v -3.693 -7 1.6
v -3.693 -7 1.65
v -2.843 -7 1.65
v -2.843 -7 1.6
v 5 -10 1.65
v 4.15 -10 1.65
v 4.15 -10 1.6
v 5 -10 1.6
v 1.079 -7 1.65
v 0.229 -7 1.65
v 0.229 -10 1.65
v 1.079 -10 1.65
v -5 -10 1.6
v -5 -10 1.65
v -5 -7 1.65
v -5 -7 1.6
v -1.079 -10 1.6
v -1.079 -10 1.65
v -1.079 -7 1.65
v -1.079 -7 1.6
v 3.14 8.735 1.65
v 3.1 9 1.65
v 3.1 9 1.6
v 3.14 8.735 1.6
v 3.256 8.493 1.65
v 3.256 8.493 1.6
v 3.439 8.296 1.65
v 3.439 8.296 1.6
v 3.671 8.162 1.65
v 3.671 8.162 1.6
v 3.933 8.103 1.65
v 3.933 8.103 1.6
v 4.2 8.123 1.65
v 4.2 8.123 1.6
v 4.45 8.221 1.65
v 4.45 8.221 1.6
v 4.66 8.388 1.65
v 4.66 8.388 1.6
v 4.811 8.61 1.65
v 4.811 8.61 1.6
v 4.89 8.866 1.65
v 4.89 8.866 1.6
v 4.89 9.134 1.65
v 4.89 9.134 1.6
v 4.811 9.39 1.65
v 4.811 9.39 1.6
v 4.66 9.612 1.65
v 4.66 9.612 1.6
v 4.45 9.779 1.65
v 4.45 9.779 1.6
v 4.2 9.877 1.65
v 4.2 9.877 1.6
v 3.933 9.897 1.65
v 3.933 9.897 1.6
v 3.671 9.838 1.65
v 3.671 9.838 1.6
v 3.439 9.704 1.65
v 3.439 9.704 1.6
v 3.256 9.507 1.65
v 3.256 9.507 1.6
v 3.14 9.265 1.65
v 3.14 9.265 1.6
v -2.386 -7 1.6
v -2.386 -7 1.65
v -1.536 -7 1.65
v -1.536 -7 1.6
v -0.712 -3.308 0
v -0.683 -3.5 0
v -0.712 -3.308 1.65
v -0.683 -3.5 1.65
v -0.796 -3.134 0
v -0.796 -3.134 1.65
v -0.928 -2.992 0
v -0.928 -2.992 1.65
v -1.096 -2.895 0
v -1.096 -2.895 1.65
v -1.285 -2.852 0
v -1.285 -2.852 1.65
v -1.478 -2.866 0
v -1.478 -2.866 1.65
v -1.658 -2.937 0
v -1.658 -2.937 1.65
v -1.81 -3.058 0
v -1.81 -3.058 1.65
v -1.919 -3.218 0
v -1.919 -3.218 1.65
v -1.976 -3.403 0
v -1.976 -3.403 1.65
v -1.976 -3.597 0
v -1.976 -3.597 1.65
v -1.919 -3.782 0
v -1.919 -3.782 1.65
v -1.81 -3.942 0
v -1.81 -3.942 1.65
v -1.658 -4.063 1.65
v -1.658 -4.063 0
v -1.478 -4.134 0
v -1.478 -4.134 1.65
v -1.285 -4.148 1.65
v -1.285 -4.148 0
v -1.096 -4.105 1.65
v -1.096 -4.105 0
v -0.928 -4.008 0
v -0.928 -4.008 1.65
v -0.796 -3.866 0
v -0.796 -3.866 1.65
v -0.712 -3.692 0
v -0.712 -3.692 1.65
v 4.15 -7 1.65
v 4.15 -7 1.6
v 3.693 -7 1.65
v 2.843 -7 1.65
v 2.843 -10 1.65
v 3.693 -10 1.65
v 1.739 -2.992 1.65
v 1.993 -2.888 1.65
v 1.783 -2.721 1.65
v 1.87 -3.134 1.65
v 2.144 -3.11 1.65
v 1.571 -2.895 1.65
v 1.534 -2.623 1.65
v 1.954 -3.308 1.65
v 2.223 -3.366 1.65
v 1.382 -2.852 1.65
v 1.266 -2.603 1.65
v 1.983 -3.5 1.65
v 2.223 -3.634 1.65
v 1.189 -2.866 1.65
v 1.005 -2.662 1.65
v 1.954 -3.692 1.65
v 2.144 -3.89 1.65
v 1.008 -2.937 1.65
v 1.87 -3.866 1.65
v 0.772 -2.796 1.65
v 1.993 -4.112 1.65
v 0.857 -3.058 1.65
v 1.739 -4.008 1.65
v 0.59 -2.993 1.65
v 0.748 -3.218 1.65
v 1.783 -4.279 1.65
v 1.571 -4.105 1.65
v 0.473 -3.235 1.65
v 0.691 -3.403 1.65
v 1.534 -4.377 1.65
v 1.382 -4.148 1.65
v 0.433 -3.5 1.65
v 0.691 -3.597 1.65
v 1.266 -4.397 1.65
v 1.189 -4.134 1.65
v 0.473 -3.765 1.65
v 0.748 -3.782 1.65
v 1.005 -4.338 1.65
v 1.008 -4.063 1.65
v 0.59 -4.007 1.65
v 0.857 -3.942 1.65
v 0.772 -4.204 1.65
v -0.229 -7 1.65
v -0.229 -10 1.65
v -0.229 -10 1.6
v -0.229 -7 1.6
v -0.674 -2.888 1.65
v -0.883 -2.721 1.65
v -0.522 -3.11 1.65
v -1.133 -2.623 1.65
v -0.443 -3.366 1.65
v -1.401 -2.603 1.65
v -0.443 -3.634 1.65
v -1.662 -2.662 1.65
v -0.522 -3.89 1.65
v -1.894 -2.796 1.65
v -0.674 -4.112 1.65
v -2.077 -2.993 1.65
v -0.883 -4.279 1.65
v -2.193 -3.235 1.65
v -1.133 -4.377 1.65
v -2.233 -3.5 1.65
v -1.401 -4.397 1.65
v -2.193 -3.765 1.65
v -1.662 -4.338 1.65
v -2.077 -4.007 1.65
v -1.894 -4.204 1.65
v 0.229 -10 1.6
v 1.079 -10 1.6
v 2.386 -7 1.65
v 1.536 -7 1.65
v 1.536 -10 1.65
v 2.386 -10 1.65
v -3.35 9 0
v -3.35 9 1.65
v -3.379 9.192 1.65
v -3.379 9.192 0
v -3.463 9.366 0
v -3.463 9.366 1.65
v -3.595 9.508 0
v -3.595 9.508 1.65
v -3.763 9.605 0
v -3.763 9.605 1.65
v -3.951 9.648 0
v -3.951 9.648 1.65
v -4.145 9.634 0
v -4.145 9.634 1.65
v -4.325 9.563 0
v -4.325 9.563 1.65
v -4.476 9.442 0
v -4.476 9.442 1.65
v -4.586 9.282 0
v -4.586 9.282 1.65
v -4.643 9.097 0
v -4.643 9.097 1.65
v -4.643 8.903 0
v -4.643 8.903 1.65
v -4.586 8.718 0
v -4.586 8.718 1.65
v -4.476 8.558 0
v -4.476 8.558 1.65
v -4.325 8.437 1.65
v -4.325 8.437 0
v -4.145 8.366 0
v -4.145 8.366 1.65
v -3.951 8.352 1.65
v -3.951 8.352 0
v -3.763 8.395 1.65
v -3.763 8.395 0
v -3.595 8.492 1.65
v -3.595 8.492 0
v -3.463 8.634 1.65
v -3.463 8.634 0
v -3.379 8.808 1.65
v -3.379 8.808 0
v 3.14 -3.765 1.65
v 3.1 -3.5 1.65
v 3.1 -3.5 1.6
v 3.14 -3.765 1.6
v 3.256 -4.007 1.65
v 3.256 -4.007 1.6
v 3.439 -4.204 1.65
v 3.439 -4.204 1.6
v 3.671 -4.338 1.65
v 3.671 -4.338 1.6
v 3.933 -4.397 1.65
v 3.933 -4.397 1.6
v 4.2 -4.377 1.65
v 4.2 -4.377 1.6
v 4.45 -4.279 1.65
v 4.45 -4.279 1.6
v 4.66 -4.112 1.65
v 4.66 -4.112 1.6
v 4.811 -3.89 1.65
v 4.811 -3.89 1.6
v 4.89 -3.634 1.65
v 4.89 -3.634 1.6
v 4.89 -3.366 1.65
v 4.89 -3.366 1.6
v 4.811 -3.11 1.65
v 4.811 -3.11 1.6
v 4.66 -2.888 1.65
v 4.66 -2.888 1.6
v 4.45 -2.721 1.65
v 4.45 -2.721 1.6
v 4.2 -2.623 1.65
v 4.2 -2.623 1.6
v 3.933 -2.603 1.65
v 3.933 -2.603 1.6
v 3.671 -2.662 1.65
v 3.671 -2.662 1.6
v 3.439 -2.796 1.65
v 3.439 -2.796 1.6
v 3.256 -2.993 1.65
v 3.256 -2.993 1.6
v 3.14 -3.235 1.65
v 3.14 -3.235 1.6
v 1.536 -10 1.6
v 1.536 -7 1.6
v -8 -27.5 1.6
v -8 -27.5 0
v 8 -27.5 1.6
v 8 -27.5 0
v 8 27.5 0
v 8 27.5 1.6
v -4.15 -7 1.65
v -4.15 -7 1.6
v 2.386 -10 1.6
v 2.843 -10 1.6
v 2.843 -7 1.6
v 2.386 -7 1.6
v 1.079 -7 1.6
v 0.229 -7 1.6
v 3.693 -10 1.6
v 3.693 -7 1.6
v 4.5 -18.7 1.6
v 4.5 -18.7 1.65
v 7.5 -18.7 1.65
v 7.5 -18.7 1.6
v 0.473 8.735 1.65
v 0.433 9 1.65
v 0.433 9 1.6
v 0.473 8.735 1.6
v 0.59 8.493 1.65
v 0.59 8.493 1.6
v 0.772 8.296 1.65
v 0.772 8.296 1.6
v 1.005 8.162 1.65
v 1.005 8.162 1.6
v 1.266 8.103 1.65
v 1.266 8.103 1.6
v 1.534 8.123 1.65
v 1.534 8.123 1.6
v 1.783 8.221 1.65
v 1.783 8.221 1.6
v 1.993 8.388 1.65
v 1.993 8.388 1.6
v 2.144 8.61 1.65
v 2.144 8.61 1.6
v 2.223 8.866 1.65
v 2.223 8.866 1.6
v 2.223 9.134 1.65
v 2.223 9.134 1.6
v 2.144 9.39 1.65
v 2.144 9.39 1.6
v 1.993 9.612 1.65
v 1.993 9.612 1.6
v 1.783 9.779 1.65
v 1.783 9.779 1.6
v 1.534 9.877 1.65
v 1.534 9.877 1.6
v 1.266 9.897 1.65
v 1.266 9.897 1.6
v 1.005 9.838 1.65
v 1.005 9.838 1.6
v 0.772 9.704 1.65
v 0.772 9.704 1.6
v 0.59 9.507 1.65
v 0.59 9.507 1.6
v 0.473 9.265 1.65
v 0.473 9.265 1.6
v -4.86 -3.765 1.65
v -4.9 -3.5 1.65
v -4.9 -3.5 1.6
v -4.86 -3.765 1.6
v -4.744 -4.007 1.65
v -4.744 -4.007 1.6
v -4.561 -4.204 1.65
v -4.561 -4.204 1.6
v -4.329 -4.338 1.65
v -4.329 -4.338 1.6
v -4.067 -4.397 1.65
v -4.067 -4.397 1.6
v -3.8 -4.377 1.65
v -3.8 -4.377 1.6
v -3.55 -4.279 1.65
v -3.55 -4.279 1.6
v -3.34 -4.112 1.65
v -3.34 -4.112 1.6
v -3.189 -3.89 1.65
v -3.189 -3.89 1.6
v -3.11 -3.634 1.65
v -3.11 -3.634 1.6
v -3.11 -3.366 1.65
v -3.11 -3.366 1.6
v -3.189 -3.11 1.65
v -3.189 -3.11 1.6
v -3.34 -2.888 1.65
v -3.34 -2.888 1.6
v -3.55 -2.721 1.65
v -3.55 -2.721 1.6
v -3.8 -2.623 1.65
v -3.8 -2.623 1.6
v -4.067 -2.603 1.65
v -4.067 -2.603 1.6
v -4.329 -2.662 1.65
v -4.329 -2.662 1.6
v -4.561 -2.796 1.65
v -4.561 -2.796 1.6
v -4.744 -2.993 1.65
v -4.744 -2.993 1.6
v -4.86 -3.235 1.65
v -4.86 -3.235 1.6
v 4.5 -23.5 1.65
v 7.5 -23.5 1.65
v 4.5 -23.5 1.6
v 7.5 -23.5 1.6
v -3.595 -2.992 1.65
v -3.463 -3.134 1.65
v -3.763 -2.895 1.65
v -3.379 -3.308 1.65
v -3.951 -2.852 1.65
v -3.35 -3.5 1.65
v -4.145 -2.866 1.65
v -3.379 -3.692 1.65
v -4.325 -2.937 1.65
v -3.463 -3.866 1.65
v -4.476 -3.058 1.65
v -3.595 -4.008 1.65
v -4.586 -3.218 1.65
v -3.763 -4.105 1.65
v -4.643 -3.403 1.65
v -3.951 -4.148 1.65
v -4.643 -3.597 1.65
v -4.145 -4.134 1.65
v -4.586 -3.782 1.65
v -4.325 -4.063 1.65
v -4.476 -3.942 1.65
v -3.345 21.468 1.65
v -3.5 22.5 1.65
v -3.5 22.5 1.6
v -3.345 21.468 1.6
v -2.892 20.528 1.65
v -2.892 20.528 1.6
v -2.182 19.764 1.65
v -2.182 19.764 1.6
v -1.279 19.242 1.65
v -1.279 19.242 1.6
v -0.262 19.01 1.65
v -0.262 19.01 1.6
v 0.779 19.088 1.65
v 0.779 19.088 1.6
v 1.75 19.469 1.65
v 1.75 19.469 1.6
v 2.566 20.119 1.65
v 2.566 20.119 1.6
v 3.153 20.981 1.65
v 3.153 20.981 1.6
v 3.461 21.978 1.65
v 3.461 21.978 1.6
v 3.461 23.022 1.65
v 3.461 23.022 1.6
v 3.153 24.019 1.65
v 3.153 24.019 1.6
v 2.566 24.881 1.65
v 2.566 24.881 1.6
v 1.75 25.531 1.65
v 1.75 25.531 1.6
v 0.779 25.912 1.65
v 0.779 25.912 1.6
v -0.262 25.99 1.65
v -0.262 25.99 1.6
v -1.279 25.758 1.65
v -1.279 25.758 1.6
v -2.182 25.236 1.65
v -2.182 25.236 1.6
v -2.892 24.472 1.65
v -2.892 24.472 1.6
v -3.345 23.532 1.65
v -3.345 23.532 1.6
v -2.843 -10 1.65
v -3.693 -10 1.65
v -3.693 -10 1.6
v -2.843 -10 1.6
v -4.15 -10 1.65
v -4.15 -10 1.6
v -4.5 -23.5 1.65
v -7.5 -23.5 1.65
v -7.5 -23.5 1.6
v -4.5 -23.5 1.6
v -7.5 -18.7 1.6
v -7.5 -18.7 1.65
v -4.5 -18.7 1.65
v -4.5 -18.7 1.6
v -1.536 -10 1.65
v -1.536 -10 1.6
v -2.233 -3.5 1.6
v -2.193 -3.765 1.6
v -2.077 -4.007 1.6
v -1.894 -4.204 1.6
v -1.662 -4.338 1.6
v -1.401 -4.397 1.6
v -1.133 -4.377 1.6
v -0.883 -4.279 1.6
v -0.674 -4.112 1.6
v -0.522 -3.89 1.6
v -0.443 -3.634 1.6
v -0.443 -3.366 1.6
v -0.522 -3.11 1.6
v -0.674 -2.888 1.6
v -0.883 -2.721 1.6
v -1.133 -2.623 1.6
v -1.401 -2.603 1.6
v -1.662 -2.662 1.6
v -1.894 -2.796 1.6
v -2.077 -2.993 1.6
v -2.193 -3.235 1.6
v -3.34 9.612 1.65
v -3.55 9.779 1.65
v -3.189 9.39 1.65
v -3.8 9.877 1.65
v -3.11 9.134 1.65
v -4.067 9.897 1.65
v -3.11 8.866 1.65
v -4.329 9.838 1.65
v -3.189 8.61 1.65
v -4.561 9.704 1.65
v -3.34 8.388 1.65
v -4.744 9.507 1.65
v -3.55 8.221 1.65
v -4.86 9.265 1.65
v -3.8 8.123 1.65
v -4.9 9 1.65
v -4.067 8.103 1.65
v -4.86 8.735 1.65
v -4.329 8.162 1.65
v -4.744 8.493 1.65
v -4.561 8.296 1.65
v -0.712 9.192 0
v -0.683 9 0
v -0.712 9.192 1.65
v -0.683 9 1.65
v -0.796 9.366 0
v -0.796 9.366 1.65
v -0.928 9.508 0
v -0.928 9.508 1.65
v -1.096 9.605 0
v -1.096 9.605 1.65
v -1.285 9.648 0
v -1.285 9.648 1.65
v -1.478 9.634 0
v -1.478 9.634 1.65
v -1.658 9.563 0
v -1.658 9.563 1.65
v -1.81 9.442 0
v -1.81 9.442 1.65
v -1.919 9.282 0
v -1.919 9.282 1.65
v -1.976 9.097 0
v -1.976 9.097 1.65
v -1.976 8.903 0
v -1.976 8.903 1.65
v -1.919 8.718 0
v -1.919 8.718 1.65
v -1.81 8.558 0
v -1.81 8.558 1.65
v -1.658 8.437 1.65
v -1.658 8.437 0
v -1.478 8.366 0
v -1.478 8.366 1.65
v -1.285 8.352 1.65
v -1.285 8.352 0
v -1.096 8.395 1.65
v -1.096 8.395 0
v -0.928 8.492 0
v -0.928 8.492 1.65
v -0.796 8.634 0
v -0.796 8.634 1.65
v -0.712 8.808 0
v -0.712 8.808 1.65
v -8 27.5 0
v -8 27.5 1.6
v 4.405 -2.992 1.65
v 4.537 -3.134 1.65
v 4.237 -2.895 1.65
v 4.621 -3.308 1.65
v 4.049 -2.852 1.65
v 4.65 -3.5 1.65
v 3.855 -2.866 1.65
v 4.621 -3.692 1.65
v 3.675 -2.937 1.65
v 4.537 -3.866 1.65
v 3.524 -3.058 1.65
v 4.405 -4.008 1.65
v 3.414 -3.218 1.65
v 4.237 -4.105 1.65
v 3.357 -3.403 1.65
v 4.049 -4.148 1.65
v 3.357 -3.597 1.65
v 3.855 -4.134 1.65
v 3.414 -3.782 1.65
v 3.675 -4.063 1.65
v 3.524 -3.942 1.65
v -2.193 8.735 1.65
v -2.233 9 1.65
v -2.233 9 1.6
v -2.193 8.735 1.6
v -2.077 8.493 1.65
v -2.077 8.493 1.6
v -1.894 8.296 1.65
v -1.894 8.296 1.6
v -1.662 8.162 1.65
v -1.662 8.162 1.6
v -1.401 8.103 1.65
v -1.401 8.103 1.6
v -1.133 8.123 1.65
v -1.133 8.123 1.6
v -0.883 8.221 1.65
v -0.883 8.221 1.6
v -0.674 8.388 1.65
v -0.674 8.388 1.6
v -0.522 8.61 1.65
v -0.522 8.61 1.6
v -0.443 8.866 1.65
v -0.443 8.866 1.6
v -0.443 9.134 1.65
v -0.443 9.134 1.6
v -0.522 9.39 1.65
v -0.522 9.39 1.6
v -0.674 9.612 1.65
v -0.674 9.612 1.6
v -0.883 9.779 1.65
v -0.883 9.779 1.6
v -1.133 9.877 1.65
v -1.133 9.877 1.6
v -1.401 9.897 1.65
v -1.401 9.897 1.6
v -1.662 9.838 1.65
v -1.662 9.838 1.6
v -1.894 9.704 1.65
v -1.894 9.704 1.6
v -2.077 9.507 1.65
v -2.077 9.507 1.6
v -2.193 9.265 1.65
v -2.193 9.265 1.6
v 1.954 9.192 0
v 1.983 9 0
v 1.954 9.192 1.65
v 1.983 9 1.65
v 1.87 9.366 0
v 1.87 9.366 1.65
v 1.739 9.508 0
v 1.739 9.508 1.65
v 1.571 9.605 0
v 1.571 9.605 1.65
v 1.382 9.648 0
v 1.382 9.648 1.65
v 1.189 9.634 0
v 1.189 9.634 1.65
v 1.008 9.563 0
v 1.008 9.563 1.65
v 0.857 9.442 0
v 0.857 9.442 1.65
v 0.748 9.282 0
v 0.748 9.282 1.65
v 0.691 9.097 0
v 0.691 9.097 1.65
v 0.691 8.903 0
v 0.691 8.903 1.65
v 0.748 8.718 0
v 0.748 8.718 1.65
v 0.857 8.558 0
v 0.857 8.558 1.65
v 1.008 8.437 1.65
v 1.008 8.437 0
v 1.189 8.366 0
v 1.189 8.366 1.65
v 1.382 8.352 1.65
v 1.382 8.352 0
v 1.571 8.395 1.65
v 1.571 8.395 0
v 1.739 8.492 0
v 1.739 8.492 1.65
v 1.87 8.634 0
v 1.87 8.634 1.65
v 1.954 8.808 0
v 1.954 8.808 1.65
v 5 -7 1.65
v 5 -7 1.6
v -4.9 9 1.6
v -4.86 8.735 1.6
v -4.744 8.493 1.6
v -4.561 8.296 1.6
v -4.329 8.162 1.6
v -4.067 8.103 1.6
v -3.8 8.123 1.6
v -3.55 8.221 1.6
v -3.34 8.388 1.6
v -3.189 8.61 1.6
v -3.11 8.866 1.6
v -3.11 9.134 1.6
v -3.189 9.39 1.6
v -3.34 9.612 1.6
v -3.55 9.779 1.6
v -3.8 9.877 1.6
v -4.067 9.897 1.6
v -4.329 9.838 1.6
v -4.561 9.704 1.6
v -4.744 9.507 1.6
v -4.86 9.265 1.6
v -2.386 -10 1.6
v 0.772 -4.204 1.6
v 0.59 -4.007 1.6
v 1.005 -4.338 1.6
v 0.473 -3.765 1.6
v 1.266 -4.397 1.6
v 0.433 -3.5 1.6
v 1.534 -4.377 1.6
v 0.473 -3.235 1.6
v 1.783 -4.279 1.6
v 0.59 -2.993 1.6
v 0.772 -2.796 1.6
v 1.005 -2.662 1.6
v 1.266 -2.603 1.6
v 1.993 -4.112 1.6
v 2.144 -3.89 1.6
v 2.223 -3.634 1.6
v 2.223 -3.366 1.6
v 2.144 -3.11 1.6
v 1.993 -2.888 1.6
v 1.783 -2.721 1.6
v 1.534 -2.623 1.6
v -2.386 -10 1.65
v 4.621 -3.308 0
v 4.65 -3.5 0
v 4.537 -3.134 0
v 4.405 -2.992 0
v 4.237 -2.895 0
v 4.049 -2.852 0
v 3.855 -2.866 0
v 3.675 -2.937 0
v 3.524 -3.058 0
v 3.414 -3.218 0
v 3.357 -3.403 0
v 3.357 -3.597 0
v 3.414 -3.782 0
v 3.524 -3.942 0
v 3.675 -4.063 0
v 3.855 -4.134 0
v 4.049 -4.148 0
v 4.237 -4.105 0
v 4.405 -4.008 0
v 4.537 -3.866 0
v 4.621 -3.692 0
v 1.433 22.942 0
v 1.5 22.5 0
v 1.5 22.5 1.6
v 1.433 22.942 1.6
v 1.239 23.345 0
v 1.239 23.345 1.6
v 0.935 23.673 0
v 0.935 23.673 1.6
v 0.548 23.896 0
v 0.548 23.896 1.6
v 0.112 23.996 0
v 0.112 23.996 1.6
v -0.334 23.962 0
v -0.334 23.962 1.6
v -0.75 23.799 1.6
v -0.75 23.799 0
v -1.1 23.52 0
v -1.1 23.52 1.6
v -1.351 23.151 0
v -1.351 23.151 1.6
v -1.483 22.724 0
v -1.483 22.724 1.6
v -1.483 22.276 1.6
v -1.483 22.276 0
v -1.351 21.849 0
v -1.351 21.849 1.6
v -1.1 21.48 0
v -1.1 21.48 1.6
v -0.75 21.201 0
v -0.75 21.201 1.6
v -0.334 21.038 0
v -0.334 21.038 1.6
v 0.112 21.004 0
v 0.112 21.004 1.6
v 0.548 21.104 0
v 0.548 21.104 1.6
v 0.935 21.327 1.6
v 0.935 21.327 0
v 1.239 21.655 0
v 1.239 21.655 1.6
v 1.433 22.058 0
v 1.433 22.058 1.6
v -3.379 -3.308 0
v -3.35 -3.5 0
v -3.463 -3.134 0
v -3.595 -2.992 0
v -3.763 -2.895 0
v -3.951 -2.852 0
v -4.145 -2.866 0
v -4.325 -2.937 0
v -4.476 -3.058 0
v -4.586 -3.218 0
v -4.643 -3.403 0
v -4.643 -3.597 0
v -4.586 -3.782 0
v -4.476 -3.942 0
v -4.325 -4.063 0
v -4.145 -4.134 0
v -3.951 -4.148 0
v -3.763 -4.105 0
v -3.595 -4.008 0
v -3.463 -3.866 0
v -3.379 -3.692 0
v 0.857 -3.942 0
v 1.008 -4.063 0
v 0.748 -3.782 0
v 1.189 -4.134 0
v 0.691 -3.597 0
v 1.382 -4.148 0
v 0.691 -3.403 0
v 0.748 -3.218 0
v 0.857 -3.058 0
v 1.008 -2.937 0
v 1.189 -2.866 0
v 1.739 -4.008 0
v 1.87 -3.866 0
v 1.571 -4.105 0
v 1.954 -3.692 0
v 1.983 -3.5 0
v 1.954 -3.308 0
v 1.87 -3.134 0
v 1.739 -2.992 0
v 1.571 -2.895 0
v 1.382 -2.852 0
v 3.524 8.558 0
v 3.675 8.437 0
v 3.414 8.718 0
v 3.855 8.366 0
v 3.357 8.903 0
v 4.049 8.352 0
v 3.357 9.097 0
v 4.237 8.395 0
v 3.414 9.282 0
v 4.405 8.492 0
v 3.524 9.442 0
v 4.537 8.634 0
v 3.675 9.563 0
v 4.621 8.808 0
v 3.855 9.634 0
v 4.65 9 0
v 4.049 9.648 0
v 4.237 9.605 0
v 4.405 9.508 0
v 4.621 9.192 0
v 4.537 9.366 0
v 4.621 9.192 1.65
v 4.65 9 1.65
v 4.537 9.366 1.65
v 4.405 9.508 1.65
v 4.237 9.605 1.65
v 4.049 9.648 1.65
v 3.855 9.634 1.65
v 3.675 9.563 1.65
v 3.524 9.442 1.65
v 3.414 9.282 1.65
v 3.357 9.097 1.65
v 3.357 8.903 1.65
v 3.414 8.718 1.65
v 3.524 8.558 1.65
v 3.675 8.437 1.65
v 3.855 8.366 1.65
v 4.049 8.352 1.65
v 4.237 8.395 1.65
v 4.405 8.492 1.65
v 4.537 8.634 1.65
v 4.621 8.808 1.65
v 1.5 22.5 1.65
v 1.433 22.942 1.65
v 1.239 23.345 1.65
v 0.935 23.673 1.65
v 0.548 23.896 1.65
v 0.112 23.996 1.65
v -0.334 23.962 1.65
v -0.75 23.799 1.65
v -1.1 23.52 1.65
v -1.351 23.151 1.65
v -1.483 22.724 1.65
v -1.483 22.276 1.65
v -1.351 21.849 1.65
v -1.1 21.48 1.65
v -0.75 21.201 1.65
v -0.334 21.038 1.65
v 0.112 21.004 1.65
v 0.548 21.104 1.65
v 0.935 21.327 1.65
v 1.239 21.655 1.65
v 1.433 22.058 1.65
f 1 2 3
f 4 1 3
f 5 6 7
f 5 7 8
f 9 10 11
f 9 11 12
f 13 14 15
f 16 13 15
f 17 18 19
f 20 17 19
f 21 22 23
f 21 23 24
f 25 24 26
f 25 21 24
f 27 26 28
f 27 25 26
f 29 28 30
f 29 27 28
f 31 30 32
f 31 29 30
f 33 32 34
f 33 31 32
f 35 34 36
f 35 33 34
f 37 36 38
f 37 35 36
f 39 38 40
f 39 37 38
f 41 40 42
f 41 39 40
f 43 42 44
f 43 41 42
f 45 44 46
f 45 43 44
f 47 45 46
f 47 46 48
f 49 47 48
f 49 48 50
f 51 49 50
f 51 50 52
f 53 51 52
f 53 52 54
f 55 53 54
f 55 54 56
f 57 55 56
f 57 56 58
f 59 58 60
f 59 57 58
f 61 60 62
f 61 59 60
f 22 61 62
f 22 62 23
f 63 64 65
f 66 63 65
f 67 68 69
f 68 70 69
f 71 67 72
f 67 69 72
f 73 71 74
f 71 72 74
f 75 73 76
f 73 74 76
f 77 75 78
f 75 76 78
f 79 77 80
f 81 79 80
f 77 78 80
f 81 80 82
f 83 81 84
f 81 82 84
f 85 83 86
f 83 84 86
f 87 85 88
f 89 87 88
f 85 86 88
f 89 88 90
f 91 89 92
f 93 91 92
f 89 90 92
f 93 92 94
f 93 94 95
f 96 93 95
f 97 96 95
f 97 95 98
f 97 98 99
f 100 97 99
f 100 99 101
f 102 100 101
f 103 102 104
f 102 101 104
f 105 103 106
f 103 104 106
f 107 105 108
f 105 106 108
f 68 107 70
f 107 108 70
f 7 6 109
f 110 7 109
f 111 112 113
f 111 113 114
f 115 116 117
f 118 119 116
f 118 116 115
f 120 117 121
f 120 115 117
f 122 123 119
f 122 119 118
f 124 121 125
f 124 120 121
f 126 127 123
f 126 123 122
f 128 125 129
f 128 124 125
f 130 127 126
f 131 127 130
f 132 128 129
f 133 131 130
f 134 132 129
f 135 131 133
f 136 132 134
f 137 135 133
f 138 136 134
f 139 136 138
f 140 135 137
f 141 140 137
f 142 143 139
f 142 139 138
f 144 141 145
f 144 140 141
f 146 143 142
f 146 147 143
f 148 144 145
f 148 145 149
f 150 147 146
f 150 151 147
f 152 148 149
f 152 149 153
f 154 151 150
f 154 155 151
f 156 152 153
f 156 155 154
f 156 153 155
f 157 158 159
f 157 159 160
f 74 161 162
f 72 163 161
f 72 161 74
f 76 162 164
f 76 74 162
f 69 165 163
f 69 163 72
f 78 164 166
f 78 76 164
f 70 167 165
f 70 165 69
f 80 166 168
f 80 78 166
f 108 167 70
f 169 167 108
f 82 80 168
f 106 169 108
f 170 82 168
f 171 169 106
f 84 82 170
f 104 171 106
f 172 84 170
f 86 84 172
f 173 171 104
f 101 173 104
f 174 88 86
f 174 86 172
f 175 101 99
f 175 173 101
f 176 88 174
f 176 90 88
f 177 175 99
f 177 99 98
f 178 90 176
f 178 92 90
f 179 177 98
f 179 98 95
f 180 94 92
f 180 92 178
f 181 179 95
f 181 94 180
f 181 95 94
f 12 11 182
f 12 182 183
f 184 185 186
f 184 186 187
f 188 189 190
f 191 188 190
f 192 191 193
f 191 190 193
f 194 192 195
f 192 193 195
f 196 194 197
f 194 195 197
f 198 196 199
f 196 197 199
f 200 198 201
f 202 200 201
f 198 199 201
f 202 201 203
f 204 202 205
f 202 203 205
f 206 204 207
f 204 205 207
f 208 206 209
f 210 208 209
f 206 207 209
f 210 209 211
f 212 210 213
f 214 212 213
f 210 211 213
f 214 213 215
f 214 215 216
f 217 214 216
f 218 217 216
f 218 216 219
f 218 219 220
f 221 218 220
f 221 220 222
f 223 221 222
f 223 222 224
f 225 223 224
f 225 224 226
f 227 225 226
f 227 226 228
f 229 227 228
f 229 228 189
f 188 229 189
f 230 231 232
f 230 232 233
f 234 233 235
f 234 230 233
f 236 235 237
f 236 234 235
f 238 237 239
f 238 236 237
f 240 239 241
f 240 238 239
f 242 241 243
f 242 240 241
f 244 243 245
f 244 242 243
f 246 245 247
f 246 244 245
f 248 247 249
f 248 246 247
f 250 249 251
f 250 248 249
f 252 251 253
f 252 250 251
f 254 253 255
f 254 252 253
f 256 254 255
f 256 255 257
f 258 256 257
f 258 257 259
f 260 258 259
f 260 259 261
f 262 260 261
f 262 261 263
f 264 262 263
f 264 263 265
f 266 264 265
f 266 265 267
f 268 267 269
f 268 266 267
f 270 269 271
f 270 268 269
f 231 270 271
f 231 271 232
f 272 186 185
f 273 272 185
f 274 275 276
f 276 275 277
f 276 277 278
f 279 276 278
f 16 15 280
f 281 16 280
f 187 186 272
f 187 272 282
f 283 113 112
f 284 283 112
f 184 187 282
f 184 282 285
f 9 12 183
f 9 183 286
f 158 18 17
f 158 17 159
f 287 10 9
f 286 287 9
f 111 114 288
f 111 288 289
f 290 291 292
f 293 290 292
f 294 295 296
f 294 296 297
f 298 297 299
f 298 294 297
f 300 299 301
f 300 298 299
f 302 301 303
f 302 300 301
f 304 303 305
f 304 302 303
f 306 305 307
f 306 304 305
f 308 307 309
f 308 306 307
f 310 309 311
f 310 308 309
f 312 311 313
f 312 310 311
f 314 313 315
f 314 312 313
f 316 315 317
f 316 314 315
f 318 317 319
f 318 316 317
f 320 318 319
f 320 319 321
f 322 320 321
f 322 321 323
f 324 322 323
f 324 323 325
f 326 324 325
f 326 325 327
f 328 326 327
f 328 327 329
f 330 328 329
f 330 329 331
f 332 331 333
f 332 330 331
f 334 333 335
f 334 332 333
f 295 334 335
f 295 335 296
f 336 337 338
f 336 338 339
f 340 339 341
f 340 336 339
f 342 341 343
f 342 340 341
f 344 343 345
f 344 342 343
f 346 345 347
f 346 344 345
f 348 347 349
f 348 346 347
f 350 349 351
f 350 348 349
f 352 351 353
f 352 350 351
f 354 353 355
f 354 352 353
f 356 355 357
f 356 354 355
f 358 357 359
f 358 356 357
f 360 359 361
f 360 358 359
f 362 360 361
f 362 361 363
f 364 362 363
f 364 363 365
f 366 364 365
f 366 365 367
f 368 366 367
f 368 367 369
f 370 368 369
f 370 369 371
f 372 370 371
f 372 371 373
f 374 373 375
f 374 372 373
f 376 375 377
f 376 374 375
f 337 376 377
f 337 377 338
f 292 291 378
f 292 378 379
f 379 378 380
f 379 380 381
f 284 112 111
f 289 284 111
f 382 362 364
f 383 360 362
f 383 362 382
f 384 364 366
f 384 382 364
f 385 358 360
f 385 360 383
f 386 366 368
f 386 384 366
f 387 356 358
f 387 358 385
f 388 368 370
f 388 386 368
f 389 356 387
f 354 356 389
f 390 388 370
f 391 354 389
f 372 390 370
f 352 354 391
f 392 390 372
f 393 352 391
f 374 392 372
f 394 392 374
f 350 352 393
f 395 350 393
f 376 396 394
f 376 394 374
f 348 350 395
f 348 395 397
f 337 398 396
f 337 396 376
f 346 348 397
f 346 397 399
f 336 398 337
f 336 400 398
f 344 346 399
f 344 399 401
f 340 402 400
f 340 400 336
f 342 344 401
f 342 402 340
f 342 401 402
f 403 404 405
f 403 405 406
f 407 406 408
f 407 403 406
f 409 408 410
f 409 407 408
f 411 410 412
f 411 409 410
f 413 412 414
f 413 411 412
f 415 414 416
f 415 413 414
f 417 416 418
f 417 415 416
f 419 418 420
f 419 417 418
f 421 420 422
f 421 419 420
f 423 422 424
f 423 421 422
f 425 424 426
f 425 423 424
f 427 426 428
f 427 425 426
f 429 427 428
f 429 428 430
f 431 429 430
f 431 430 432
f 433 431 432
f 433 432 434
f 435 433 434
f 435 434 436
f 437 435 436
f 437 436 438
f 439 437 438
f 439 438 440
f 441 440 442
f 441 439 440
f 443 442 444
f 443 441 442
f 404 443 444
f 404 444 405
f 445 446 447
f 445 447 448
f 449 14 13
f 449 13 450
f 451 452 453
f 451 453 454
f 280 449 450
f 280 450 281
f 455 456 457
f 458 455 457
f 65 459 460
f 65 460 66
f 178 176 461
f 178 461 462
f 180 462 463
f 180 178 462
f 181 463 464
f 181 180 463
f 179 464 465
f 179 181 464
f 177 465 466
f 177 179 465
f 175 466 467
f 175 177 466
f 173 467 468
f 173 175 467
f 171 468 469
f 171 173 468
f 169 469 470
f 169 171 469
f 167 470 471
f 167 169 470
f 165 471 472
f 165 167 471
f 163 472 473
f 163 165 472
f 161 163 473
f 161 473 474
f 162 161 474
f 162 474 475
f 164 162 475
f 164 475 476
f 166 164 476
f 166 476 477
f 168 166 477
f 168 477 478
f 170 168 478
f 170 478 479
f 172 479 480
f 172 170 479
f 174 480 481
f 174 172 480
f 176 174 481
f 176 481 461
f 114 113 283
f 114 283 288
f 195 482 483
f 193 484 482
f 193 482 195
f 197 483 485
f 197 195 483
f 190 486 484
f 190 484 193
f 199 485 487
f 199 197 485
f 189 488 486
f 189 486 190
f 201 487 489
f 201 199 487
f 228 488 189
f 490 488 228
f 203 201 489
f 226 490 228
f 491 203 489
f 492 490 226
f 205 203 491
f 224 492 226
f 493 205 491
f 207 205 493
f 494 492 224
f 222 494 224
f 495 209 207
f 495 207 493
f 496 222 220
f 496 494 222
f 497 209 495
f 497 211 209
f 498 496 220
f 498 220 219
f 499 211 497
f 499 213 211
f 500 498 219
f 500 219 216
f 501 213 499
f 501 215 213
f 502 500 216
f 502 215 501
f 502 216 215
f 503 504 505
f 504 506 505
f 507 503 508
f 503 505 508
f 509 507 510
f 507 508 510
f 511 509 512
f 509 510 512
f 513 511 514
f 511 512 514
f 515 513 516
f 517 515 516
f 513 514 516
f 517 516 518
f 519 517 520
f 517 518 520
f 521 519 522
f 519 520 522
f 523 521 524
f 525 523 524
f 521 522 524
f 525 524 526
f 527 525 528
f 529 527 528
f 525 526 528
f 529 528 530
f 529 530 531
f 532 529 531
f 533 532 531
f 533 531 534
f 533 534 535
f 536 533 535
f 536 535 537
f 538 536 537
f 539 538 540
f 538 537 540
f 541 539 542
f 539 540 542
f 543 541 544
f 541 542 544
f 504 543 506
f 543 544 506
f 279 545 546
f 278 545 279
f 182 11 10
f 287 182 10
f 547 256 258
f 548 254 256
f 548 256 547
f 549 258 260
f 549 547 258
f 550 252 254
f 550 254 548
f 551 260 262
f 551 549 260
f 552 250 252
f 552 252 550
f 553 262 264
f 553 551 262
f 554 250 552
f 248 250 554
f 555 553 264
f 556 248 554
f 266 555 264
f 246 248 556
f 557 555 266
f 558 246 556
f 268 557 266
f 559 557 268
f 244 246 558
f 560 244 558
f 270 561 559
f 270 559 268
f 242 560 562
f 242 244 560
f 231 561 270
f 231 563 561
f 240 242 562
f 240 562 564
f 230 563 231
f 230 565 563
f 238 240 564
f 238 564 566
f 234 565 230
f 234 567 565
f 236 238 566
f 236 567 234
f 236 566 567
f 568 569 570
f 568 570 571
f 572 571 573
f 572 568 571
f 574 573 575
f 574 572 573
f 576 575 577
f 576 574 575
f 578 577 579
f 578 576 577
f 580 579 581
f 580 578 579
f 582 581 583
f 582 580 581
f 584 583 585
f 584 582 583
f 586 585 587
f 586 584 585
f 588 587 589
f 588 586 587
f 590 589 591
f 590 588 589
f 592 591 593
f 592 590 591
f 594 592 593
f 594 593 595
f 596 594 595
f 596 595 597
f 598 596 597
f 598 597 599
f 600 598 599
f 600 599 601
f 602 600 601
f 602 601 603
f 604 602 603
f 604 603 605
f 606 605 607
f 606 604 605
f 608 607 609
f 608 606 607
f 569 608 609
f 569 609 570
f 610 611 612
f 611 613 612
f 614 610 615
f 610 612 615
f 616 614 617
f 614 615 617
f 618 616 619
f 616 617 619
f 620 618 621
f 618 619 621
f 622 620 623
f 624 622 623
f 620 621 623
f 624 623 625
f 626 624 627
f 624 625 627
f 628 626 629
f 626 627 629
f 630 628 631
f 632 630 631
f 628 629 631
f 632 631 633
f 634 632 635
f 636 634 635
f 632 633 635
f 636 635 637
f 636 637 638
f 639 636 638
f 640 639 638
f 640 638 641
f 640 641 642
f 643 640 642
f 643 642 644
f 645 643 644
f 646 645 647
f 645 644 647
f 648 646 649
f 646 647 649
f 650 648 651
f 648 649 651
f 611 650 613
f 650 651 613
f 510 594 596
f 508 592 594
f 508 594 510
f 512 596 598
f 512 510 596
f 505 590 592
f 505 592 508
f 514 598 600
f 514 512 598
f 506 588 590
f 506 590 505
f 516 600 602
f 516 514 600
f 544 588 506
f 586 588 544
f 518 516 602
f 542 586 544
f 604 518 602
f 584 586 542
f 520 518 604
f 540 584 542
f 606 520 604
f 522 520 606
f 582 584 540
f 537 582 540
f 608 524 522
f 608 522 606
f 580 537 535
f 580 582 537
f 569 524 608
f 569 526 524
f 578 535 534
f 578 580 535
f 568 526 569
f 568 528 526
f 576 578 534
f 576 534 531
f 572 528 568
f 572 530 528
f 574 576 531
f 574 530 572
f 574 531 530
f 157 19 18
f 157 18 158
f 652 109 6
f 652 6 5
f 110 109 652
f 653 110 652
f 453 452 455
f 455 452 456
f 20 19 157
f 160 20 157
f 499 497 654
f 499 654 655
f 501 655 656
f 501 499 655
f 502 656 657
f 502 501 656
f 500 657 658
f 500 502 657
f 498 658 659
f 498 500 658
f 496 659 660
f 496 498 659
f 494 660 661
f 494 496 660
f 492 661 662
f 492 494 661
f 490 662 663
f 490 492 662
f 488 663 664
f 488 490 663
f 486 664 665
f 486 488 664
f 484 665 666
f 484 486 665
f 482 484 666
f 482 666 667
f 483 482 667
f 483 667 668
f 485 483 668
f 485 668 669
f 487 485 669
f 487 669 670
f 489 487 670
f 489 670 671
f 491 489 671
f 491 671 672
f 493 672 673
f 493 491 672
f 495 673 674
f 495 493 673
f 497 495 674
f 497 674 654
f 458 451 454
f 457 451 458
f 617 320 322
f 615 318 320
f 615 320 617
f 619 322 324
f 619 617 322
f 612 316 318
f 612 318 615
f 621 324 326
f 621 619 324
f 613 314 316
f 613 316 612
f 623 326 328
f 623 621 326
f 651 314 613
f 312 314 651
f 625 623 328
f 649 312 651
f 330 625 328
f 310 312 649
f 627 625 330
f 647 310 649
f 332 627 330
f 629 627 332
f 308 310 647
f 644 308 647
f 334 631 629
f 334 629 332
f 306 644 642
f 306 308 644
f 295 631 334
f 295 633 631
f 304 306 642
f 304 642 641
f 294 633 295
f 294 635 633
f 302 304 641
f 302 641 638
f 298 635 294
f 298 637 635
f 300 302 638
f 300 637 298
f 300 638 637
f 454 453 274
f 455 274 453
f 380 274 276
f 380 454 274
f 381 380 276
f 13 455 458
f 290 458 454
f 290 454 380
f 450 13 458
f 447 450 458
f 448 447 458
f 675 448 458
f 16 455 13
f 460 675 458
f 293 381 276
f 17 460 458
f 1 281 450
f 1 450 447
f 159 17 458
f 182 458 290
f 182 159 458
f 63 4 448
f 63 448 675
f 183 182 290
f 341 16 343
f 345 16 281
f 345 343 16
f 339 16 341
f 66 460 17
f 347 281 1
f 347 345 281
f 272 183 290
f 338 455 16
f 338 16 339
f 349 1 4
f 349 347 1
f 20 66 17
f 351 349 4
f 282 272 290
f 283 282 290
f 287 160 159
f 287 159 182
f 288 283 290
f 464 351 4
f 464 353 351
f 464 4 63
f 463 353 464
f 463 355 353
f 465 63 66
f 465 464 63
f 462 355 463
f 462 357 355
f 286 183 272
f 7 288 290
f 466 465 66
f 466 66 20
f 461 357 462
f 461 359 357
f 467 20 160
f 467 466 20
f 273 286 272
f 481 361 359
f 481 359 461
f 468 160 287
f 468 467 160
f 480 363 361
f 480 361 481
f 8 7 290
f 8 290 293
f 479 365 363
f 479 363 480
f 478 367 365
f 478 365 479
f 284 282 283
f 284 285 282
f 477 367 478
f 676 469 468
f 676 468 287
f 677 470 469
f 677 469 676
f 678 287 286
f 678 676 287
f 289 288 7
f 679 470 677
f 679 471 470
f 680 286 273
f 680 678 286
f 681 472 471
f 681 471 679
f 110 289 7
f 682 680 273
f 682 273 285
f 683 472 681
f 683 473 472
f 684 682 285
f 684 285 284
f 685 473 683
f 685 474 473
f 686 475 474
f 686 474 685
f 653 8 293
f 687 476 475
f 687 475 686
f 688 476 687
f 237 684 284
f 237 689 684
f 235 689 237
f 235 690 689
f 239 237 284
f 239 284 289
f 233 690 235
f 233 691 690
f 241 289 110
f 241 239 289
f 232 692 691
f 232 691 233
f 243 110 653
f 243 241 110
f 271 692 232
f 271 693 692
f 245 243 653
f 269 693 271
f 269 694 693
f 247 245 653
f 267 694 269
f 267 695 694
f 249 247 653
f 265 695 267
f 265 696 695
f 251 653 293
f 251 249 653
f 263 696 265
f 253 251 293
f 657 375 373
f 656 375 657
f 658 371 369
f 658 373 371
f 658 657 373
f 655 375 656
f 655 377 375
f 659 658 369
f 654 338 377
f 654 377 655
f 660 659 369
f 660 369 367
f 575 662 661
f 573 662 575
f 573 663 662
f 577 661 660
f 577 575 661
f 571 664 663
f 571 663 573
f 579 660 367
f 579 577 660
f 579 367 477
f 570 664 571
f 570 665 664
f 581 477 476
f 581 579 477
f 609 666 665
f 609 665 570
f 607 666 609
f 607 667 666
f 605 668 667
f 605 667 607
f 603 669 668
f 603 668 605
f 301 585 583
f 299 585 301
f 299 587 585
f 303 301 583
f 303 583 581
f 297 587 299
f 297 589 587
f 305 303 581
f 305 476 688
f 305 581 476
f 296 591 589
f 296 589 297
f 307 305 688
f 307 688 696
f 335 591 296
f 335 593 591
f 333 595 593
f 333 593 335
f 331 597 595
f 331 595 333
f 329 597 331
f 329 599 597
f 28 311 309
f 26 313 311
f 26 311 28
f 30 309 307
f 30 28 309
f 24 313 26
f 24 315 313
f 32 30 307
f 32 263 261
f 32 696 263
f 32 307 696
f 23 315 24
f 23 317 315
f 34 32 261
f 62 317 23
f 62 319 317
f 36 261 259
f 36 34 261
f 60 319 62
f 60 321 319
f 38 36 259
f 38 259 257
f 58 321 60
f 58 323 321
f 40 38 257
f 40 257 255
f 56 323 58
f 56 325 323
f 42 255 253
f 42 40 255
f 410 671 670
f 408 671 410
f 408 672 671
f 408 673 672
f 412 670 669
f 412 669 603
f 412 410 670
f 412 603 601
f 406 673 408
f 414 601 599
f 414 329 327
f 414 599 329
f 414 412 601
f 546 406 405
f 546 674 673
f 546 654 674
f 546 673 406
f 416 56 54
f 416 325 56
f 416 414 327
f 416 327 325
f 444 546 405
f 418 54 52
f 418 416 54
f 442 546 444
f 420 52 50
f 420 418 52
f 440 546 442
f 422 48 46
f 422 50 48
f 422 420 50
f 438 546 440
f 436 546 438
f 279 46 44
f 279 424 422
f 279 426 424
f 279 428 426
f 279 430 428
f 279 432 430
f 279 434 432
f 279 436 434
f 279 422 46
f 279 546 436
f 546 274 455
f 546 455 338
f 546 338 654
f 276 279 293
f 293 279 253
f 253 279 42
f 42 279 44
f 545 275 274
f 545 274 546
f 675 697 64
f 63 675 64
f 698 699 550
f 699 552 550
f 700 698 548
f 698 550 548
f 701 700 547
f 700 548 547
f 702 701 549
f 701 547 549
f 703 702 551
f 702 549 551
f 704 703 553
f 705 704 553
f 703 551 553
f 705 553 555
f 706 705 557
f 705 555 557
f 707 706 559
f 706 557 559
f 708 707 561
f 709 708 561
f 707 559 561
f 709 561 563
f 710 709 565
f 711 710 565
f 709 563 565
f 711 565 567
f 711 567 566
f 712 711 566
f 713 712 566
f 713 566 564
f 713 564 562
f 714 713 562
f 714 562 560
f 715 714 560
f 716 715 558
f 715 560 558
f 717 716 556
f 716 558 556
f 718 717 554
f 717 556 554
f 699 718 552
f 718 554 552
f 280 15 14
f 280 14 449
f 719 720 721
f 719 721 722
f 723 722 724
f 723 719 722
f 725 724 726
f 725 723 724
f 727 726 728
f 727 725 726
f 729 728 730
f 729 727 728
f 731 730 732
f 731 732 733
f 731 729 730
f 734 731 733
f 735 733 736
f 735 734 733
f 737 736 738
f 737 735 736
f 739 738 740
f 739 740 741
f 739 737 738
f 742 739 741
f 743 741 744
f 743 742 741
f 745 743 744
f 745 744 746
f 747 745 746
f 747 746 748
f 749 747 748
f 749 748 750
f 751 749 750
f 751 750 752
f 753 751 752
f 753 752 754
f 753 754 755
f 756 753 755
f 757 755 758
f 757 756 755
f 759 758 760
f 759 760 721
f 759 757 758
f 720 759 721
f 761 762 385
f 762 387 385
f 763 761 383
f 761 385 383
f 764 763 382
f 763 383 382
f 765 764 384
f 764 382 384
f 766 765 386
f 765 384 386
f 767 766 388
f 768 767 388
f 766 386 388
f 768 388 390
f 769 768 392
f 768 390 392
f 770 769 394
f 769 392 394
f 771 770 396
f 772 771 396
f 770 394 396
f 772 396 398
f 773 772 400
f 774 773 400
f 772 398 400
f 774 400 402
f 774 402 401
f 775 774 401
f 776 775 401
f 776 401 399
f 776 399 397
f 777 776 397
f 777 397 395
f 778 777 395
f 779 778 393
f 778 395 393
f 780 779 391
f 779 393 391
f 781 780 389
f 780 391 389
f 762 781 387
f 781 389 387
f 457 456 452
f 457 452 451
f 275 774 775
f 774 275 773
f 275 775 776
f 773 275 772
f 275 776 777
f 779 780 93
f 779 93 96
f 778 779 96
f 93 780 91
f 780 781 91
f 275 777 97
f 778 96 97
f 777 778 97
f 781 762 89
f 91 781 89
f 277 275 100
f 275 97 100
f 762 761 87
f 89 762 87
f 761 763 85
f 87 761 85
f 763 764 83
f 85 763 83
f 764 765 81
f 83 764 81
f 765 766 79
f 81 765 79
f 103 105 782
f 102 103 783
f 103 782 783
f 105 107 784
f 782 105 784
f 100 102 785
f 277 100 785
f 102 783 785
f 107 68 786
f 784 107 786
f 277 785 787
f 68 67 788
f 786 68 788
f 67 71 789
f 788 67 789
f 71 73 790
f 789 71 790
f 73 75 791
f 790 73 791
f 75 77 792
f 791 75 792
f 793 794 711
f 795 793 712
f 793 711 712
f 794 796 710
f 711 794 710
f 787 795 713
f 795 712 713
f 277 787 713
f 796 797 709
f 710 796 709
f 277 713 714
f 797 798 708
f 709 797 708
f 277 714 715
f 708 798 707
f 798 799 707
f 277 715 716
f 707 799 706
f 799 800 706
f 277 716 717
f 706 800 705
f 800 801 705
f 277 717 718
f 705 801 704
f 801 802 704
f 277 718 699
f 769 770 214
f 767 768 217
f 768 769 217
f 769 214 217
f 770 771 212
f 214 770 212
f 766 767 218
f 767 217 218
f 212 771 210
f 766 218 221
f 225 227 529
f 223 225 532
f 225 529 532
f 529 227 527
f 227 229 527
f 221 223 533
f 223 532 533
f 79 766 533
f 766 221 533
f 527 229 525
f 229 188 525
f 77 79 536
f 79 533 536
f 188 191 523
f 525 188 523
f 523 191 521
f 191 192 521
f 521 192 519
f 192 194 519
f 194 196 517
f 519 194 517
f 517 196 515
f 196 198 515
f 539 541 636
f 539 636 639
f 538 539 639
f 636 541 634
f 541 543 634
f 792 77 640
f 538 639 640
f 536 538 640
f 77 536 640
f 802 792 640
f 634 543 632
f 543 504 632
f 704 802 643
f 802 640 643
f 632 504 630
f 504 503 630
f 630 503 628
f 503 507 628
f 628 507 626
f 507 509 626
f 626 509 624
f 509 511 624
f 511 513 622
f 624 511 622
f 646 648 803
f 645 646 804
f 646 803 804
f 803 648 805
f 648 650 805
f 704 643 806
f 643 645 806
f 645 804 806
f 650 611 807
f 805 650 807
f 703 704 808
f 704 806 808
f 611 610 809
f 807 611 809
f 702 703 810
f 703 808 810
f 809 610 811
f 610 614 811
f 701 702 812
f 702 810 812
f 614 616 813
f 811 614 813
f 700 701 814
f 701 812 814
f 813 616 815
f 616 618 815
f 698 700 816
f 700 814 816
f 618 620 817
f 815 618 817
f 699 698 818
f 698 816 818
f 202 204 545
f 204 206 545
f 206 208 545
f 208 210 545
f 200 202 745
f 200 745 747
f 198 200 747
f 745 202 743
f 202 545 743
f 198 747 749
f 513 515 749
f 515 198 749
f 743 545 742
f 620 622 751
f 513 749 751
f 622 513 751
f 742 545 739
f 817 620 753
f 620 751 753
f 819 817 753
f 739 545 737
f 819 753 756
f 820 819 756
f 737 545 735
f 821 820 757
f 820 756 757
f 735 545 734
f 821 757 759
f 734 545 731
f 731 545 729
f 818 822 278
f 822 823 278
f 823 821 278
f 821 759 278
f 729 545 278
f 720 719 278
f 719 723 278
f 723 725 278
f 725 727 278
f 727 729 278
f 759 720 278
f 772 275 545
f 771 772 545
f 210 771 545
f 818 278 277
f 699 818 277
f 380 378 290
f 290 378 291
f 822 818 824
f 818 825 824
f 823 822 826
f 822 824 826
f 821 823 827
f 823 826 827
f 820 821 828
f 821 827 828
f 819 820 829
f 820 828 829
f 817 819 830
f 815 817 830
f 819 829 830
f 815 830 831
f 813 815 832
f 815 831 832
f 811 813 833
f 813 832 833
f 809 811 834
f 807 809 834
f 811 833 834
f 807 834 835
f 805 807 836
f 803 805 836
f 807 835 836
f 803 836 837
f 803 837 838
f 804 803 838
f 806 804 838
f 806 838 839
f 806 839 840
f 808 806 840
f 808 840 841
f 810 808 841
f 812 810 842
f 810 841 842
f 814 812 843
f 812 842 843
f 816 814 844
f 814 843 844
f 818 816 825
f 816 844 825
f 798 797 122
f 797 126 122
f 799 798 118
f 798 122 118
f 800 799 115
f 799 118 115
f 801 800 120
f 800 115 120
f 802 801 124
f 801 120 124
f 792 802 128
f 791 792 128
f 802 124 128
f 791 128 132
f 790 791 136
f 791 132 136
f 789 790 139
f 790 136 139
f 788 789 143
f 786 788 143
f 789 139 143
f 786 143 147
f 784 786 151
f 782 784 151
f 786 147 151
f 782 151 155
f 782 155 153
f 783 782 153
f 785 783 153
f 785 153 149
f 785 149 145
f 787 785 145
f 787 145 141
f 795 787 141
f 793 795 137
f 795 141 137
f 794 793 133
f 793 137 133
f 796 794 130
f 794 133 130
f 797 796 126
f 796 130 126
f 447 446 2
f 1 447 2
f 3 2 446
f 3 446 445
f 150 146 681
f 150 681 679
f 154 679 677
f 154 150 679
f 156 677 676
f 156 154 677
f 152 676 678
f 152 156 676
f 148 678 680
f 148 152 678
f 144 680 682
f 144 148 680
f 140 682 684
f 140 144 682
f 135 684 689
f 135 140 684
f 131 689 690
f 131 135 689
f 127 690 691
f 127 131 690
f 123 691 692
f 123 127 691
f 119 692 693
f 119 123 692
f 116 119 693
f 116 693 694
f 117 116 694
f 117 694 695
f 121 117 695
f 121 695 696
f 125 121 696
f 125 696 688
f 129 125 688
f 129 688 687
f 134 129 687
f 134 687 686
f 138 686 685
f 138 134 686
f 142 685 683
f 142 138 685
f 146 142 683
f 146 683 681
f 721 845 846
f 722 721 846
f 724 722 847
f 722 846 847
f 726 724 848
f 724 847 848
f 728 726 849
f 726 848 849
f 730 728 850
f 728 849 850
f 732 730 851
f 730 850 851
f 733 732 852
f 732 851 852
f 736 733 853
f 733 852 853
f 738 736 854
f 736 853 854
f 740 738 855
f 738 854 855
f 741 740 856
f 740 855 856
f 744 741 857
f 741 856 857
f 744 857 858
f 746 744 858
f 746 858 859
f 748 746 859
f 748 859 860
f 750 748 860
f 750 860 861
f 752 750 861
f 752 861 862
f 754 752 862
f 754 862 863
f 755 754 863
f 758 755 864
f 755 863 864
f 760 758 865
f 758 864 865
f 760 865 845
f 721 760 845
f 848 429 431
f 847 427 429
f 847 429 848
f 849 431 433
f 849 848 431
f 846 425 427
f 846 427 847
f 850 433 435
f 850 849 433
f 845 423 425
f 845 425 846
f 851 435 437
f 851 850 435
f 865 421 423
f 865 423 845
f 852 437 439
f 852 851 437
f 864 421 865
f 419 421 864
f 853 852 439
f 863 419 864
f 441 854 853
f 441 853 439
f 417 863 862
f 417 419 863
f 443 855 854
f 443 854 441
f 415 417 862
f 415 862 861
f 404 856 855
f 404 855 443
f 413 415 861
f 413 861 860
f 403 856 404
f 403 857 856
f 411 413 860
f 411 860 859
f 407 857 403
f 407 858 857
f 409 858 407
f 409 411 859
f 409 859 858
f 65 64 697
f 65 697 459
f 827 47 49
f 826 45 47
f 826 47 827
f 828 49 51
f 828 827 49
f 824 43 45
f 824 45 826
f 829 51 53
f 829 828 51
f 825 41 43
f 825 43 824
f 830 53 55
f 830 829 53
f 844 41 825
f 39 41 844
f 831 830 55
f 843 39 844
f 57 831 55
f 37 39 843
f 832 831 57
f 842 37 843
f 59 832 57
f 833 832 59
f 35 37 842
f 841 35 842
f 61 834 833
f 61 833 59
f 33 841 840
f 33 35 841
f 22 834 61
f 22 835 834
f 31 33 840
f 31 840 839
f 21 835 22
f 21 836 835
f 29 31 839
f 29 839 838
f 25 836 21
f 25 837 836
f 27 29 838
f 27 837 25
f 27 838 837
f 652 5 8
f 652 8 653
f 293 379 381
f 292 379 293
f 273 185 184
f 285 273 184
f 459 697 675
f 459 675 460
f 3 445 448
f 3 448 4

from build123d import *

# Parameters (mm, degrees)
SKETCH1_W           = 16
SKETCH1_H           = 55
SKETCH1_R           = 1.5
BOSS_EXTRUDE1_DEPTH = 1.6
SKETCH3_R           = 0.65
CUT_EXTRUDE1_DEPTH  = 29.684664893
BOSS_EXTRUDE3_START = 0.05
SKETCH4_R           = 0.9
SKETCH4_R_2         = 0.65
SKETCH4_R_3         = 3.5
SKETCH4_R_4         = 1.5
SKETCH4_W           = 0.85
SKETCH4_H           = 3
SKETCH4_W_2         = 3
SKETCH4_H_2         = 4.8
BOSS_EXTRUDE3_DEPTH = 0.05


with BuildPart() as part:
    # Sketch1 → Boss-Extrude1 (new body)
    with BuildSketch(Plane.XY):
        Rectangle(SKETCH1_W, SKETCH1_H)
        with Locations((0, 22.5)):
            Circle(SKETCH1_R, mode=Mode.SUBTRACT)
    extrude(amount=BOSS_EXTRUDE1_DEPTH)

    # Sketch3 → Cut-Extrude1 (cut, through all)
    with BuildSketch(Plane.XY.offset(1.6)):
        with Locations((-4, -3.5)):
            Circle(SKETCH3_R)
        with Locations((-1.333333333, -3.5)):
            Circle(SKETCH3_R)
        with Locations((1.333333333, -3.5)):
            Circle(SKETCH3_R)
        with Locations((4, -3.5)):
            Circle(SKETCH3_R)
        with Locations((-4, 9)):
            Circle(SKETCH3_R)
        with Locations((-1.333333333, 9)):
            Circle(SKETCH3_R)
        with Locations((1.333333333, 9)):
            Circle(SKETCH3_R)
        with Locations((4, 9)):
            Circle(SKETCH3_R)
    extrude(amount=-CUT_EXTRUDE1_DEPTH, mode=Mode.SUBTRACT)

    # Sketch4 → Boss-Extrude3 (add)
    # profile 1 of 19: a face of its own
    with BuildSketch(Plane.XY.offset(1.6).offset(BOSS_EXTRUDE3_START)):
        with Locations(Location((-4, 9, 0), (0, 0, 180))):
            Circle(SKETCH4_R)
        with Locations((-4, 9)):
            Circle(SKETCH4_R_2, mode=Mode.SUBTRACT)
    # profile 2 of 19: a face of its own
    with BuildSketch(Plane.XY.offset(1.6).offset(BOSS_EXTRUDE3_START)):
        with Locations(Location((-1.333333333, 9, 0), (0, 0, 180))):
            Circle(SKETCH4_R)
        with Locations((-1.333333333, 9)):
            Circle(SKETCH4_R_2, mode=Mode.SUBTRACT)
    # profile 3 of 19: a face of its own
    with BuildSketch(Plane.XY.offset(1.6).offset(BOSS_EXTRUDE3_START)):
        with Locations(Location((1.333333333, 9, 0), (0, 0, 180))):
            Circle(SKETCH4_R)
        with Locations((1.333333333, 9)):
            Circle(SKETCH4_R_2, mode=Mode.SUBTRACT)
    # profile 4 of 19: a face of its own
    with BuildSketch(Plane.XY.offset(1.6).offset(BOSS_EXTRUDE3_START)):
        with Locations(Location((4, 9, 0), (0, 0, 180))):
            Circle(SKETCH4_R)
        with Locations((4, 9)):
            Circle(SKETCH4_R_2, mode=Mode.SUBTRACT)
    # profile 5 of 19: a face of its own
    with BuildSketch(Plane.XY.offset(1.6).offset(BOSS_EXTRUDE3_START)):
        with Locations(Location((4, -3.5, 0), (0, 0, 180))):
            Circle(SKETCH4_R)
        with Locations((4, -3.5)):
            Circle(SKETCH4_R_2, mode=Mode.SUBTRACT)
    # profile 6 of 19: a face of its own
    with BuildSketch(Plane.XY.offset(1.6).offset(BOSS_EXTRUDE3_START)):
        with Locations(Location((1.333333333, -3.5, 0), (0, 0, 180))):
            Circle(SKETCH4_R)
        with Locations((1.333333333, -3.5)):
            Circle(SKETCH4_R_2, mode=Mode.SUBTRACT)
    # profile 7 of 19: a face of its own
    with BuildSketch(Plane.XY.offset(1.6).offset(BOSS_EXTRUDE3_START)):
        with Locations(Location((-1.333333333, -3.5, 0), (0, 0, 180))):
            Circle(SKETCH4_R)
        with Locations((-1.333333333, -3.5)):
            Circle(SKETCH4_R_2, mode=Mode.SUBTRACT)
    # profile 8 of 19: a face of its own
    with BuildSketch(Plane.XY.offset(1.6).offset(BOSS_EXTRUDE3_START)):
        with Locations(Location((-4, -3.5, 0), (0, 0, 180))):
            Circle(SKETCH4_R)
        with Locations((-4, -3.5)):
            Circle(SKETCH4_R_2, mode=Mode.SUBTRACT)
    # profile 9 of 19: a face of its own
    with BuildSketch(Plane.XY.offset(1.6).offset(BOSS_EXTRUDE3_START)):
        with Locations(Location((0, 22.5, 0), (0, 0, 180))):
            Circle(SKETCH4_R_3)
        with Locations((0, 22.5)):
            Circle(SKETCH4_R_4, mode=Mode.SUBTRACT)
    # profile 10 of 19: a face of its own
    with BuildSketch(Plane.XY.offset(1.6).offset(BOSS_EXTRUDE3_START)):
        with Locations((-4.575, -8.5)):
            Rectangle(SKETCH4_W, SKETCH4_H)
    # profile 11 of 19: a face of its own
    with BuildSketch(Plane.XY.offset(1.6).offset(BOSS_EXTRUDE3_START)):
        with Locations((-3.267857143, -8.5)):
            Rectangle(SKETCH4_W, SKETCH4_H)
    # profile 12 of 19: a face of its own
    with BuildSketch(Plane.XY.offset(1.6).offset(BOSS_EXTRUDE3_START)):
        with Locations((-1.960714286, -8.5)):
            Rectangle(SKETCH4_W, SKETCH4_H)
    # profile 13 of 19: a face of its own
    with BuildSketch(Plane.XY.offset(1.6).offset(BOSS_EXTRUDE3_START)):
        with Locations((-0.653571429, -8.5)):
            Rectangle(SKETCH4_W, SKETCH4_H)
    # profile 14 of 19: a face of its own
    with BuildSketch(Plane.XY.offset(1.6).offset(BOSS_EXTRUDE3_START)):
        with Locations((0.653571429, -8.5)):
            Rectangle(SKETCH4_W, SKETCH4_H)
    # profile 15 of 19: a face of its own
    with BuildSketch(Plane.XY.offset(1.6).offset(BOSS_EXTRUDE3_START)):
        with Locations((1.960714286, -8.5)):
            Rectangle(SKETCH4_W, SKETCH4_H)
    # profile 16 of 19: a face of its own
    with BuildSketch(Plane.XY.offset(1.6).offset(BOSS_EXTRUDE3_START)):
        with Locations((3.267857143, -8.5)):
            Rectangle(SKETCH4_W, SKETCH4_H)
    # profile 17 of 19: a face of its own
    with BuildSketch(Plane.XY.offset(1.6).offset(BOSS_EXTRUDE3_START)):
        with Locations((4.575, -8.5)):
            Rectangle(SKETCH4_W, SKETCH4_H)
    # profile 18 of 19: a face of its own
    with BuildSketch(Plane.XY.offset(1.6).offset(BOSS_EXTRUDE3_START)):
        with Locations((-6, -21.1)):
            Rectangle(SKETCH4_W_2, SKETCH4_H_2)
    # profile 19 of 19: a face of its own
    with BuildSketch(Plane.XY.offset(1.6).offset(BOSS_EXTRUDE3_START)):
        with Locations((6, -21.1)):
            Rectangle(SKETCH4_W_2, SKETCH4_H_2)
    extrude(amount=-BOSS_EXTRUDE3_DEPTH)


solid = part.part
